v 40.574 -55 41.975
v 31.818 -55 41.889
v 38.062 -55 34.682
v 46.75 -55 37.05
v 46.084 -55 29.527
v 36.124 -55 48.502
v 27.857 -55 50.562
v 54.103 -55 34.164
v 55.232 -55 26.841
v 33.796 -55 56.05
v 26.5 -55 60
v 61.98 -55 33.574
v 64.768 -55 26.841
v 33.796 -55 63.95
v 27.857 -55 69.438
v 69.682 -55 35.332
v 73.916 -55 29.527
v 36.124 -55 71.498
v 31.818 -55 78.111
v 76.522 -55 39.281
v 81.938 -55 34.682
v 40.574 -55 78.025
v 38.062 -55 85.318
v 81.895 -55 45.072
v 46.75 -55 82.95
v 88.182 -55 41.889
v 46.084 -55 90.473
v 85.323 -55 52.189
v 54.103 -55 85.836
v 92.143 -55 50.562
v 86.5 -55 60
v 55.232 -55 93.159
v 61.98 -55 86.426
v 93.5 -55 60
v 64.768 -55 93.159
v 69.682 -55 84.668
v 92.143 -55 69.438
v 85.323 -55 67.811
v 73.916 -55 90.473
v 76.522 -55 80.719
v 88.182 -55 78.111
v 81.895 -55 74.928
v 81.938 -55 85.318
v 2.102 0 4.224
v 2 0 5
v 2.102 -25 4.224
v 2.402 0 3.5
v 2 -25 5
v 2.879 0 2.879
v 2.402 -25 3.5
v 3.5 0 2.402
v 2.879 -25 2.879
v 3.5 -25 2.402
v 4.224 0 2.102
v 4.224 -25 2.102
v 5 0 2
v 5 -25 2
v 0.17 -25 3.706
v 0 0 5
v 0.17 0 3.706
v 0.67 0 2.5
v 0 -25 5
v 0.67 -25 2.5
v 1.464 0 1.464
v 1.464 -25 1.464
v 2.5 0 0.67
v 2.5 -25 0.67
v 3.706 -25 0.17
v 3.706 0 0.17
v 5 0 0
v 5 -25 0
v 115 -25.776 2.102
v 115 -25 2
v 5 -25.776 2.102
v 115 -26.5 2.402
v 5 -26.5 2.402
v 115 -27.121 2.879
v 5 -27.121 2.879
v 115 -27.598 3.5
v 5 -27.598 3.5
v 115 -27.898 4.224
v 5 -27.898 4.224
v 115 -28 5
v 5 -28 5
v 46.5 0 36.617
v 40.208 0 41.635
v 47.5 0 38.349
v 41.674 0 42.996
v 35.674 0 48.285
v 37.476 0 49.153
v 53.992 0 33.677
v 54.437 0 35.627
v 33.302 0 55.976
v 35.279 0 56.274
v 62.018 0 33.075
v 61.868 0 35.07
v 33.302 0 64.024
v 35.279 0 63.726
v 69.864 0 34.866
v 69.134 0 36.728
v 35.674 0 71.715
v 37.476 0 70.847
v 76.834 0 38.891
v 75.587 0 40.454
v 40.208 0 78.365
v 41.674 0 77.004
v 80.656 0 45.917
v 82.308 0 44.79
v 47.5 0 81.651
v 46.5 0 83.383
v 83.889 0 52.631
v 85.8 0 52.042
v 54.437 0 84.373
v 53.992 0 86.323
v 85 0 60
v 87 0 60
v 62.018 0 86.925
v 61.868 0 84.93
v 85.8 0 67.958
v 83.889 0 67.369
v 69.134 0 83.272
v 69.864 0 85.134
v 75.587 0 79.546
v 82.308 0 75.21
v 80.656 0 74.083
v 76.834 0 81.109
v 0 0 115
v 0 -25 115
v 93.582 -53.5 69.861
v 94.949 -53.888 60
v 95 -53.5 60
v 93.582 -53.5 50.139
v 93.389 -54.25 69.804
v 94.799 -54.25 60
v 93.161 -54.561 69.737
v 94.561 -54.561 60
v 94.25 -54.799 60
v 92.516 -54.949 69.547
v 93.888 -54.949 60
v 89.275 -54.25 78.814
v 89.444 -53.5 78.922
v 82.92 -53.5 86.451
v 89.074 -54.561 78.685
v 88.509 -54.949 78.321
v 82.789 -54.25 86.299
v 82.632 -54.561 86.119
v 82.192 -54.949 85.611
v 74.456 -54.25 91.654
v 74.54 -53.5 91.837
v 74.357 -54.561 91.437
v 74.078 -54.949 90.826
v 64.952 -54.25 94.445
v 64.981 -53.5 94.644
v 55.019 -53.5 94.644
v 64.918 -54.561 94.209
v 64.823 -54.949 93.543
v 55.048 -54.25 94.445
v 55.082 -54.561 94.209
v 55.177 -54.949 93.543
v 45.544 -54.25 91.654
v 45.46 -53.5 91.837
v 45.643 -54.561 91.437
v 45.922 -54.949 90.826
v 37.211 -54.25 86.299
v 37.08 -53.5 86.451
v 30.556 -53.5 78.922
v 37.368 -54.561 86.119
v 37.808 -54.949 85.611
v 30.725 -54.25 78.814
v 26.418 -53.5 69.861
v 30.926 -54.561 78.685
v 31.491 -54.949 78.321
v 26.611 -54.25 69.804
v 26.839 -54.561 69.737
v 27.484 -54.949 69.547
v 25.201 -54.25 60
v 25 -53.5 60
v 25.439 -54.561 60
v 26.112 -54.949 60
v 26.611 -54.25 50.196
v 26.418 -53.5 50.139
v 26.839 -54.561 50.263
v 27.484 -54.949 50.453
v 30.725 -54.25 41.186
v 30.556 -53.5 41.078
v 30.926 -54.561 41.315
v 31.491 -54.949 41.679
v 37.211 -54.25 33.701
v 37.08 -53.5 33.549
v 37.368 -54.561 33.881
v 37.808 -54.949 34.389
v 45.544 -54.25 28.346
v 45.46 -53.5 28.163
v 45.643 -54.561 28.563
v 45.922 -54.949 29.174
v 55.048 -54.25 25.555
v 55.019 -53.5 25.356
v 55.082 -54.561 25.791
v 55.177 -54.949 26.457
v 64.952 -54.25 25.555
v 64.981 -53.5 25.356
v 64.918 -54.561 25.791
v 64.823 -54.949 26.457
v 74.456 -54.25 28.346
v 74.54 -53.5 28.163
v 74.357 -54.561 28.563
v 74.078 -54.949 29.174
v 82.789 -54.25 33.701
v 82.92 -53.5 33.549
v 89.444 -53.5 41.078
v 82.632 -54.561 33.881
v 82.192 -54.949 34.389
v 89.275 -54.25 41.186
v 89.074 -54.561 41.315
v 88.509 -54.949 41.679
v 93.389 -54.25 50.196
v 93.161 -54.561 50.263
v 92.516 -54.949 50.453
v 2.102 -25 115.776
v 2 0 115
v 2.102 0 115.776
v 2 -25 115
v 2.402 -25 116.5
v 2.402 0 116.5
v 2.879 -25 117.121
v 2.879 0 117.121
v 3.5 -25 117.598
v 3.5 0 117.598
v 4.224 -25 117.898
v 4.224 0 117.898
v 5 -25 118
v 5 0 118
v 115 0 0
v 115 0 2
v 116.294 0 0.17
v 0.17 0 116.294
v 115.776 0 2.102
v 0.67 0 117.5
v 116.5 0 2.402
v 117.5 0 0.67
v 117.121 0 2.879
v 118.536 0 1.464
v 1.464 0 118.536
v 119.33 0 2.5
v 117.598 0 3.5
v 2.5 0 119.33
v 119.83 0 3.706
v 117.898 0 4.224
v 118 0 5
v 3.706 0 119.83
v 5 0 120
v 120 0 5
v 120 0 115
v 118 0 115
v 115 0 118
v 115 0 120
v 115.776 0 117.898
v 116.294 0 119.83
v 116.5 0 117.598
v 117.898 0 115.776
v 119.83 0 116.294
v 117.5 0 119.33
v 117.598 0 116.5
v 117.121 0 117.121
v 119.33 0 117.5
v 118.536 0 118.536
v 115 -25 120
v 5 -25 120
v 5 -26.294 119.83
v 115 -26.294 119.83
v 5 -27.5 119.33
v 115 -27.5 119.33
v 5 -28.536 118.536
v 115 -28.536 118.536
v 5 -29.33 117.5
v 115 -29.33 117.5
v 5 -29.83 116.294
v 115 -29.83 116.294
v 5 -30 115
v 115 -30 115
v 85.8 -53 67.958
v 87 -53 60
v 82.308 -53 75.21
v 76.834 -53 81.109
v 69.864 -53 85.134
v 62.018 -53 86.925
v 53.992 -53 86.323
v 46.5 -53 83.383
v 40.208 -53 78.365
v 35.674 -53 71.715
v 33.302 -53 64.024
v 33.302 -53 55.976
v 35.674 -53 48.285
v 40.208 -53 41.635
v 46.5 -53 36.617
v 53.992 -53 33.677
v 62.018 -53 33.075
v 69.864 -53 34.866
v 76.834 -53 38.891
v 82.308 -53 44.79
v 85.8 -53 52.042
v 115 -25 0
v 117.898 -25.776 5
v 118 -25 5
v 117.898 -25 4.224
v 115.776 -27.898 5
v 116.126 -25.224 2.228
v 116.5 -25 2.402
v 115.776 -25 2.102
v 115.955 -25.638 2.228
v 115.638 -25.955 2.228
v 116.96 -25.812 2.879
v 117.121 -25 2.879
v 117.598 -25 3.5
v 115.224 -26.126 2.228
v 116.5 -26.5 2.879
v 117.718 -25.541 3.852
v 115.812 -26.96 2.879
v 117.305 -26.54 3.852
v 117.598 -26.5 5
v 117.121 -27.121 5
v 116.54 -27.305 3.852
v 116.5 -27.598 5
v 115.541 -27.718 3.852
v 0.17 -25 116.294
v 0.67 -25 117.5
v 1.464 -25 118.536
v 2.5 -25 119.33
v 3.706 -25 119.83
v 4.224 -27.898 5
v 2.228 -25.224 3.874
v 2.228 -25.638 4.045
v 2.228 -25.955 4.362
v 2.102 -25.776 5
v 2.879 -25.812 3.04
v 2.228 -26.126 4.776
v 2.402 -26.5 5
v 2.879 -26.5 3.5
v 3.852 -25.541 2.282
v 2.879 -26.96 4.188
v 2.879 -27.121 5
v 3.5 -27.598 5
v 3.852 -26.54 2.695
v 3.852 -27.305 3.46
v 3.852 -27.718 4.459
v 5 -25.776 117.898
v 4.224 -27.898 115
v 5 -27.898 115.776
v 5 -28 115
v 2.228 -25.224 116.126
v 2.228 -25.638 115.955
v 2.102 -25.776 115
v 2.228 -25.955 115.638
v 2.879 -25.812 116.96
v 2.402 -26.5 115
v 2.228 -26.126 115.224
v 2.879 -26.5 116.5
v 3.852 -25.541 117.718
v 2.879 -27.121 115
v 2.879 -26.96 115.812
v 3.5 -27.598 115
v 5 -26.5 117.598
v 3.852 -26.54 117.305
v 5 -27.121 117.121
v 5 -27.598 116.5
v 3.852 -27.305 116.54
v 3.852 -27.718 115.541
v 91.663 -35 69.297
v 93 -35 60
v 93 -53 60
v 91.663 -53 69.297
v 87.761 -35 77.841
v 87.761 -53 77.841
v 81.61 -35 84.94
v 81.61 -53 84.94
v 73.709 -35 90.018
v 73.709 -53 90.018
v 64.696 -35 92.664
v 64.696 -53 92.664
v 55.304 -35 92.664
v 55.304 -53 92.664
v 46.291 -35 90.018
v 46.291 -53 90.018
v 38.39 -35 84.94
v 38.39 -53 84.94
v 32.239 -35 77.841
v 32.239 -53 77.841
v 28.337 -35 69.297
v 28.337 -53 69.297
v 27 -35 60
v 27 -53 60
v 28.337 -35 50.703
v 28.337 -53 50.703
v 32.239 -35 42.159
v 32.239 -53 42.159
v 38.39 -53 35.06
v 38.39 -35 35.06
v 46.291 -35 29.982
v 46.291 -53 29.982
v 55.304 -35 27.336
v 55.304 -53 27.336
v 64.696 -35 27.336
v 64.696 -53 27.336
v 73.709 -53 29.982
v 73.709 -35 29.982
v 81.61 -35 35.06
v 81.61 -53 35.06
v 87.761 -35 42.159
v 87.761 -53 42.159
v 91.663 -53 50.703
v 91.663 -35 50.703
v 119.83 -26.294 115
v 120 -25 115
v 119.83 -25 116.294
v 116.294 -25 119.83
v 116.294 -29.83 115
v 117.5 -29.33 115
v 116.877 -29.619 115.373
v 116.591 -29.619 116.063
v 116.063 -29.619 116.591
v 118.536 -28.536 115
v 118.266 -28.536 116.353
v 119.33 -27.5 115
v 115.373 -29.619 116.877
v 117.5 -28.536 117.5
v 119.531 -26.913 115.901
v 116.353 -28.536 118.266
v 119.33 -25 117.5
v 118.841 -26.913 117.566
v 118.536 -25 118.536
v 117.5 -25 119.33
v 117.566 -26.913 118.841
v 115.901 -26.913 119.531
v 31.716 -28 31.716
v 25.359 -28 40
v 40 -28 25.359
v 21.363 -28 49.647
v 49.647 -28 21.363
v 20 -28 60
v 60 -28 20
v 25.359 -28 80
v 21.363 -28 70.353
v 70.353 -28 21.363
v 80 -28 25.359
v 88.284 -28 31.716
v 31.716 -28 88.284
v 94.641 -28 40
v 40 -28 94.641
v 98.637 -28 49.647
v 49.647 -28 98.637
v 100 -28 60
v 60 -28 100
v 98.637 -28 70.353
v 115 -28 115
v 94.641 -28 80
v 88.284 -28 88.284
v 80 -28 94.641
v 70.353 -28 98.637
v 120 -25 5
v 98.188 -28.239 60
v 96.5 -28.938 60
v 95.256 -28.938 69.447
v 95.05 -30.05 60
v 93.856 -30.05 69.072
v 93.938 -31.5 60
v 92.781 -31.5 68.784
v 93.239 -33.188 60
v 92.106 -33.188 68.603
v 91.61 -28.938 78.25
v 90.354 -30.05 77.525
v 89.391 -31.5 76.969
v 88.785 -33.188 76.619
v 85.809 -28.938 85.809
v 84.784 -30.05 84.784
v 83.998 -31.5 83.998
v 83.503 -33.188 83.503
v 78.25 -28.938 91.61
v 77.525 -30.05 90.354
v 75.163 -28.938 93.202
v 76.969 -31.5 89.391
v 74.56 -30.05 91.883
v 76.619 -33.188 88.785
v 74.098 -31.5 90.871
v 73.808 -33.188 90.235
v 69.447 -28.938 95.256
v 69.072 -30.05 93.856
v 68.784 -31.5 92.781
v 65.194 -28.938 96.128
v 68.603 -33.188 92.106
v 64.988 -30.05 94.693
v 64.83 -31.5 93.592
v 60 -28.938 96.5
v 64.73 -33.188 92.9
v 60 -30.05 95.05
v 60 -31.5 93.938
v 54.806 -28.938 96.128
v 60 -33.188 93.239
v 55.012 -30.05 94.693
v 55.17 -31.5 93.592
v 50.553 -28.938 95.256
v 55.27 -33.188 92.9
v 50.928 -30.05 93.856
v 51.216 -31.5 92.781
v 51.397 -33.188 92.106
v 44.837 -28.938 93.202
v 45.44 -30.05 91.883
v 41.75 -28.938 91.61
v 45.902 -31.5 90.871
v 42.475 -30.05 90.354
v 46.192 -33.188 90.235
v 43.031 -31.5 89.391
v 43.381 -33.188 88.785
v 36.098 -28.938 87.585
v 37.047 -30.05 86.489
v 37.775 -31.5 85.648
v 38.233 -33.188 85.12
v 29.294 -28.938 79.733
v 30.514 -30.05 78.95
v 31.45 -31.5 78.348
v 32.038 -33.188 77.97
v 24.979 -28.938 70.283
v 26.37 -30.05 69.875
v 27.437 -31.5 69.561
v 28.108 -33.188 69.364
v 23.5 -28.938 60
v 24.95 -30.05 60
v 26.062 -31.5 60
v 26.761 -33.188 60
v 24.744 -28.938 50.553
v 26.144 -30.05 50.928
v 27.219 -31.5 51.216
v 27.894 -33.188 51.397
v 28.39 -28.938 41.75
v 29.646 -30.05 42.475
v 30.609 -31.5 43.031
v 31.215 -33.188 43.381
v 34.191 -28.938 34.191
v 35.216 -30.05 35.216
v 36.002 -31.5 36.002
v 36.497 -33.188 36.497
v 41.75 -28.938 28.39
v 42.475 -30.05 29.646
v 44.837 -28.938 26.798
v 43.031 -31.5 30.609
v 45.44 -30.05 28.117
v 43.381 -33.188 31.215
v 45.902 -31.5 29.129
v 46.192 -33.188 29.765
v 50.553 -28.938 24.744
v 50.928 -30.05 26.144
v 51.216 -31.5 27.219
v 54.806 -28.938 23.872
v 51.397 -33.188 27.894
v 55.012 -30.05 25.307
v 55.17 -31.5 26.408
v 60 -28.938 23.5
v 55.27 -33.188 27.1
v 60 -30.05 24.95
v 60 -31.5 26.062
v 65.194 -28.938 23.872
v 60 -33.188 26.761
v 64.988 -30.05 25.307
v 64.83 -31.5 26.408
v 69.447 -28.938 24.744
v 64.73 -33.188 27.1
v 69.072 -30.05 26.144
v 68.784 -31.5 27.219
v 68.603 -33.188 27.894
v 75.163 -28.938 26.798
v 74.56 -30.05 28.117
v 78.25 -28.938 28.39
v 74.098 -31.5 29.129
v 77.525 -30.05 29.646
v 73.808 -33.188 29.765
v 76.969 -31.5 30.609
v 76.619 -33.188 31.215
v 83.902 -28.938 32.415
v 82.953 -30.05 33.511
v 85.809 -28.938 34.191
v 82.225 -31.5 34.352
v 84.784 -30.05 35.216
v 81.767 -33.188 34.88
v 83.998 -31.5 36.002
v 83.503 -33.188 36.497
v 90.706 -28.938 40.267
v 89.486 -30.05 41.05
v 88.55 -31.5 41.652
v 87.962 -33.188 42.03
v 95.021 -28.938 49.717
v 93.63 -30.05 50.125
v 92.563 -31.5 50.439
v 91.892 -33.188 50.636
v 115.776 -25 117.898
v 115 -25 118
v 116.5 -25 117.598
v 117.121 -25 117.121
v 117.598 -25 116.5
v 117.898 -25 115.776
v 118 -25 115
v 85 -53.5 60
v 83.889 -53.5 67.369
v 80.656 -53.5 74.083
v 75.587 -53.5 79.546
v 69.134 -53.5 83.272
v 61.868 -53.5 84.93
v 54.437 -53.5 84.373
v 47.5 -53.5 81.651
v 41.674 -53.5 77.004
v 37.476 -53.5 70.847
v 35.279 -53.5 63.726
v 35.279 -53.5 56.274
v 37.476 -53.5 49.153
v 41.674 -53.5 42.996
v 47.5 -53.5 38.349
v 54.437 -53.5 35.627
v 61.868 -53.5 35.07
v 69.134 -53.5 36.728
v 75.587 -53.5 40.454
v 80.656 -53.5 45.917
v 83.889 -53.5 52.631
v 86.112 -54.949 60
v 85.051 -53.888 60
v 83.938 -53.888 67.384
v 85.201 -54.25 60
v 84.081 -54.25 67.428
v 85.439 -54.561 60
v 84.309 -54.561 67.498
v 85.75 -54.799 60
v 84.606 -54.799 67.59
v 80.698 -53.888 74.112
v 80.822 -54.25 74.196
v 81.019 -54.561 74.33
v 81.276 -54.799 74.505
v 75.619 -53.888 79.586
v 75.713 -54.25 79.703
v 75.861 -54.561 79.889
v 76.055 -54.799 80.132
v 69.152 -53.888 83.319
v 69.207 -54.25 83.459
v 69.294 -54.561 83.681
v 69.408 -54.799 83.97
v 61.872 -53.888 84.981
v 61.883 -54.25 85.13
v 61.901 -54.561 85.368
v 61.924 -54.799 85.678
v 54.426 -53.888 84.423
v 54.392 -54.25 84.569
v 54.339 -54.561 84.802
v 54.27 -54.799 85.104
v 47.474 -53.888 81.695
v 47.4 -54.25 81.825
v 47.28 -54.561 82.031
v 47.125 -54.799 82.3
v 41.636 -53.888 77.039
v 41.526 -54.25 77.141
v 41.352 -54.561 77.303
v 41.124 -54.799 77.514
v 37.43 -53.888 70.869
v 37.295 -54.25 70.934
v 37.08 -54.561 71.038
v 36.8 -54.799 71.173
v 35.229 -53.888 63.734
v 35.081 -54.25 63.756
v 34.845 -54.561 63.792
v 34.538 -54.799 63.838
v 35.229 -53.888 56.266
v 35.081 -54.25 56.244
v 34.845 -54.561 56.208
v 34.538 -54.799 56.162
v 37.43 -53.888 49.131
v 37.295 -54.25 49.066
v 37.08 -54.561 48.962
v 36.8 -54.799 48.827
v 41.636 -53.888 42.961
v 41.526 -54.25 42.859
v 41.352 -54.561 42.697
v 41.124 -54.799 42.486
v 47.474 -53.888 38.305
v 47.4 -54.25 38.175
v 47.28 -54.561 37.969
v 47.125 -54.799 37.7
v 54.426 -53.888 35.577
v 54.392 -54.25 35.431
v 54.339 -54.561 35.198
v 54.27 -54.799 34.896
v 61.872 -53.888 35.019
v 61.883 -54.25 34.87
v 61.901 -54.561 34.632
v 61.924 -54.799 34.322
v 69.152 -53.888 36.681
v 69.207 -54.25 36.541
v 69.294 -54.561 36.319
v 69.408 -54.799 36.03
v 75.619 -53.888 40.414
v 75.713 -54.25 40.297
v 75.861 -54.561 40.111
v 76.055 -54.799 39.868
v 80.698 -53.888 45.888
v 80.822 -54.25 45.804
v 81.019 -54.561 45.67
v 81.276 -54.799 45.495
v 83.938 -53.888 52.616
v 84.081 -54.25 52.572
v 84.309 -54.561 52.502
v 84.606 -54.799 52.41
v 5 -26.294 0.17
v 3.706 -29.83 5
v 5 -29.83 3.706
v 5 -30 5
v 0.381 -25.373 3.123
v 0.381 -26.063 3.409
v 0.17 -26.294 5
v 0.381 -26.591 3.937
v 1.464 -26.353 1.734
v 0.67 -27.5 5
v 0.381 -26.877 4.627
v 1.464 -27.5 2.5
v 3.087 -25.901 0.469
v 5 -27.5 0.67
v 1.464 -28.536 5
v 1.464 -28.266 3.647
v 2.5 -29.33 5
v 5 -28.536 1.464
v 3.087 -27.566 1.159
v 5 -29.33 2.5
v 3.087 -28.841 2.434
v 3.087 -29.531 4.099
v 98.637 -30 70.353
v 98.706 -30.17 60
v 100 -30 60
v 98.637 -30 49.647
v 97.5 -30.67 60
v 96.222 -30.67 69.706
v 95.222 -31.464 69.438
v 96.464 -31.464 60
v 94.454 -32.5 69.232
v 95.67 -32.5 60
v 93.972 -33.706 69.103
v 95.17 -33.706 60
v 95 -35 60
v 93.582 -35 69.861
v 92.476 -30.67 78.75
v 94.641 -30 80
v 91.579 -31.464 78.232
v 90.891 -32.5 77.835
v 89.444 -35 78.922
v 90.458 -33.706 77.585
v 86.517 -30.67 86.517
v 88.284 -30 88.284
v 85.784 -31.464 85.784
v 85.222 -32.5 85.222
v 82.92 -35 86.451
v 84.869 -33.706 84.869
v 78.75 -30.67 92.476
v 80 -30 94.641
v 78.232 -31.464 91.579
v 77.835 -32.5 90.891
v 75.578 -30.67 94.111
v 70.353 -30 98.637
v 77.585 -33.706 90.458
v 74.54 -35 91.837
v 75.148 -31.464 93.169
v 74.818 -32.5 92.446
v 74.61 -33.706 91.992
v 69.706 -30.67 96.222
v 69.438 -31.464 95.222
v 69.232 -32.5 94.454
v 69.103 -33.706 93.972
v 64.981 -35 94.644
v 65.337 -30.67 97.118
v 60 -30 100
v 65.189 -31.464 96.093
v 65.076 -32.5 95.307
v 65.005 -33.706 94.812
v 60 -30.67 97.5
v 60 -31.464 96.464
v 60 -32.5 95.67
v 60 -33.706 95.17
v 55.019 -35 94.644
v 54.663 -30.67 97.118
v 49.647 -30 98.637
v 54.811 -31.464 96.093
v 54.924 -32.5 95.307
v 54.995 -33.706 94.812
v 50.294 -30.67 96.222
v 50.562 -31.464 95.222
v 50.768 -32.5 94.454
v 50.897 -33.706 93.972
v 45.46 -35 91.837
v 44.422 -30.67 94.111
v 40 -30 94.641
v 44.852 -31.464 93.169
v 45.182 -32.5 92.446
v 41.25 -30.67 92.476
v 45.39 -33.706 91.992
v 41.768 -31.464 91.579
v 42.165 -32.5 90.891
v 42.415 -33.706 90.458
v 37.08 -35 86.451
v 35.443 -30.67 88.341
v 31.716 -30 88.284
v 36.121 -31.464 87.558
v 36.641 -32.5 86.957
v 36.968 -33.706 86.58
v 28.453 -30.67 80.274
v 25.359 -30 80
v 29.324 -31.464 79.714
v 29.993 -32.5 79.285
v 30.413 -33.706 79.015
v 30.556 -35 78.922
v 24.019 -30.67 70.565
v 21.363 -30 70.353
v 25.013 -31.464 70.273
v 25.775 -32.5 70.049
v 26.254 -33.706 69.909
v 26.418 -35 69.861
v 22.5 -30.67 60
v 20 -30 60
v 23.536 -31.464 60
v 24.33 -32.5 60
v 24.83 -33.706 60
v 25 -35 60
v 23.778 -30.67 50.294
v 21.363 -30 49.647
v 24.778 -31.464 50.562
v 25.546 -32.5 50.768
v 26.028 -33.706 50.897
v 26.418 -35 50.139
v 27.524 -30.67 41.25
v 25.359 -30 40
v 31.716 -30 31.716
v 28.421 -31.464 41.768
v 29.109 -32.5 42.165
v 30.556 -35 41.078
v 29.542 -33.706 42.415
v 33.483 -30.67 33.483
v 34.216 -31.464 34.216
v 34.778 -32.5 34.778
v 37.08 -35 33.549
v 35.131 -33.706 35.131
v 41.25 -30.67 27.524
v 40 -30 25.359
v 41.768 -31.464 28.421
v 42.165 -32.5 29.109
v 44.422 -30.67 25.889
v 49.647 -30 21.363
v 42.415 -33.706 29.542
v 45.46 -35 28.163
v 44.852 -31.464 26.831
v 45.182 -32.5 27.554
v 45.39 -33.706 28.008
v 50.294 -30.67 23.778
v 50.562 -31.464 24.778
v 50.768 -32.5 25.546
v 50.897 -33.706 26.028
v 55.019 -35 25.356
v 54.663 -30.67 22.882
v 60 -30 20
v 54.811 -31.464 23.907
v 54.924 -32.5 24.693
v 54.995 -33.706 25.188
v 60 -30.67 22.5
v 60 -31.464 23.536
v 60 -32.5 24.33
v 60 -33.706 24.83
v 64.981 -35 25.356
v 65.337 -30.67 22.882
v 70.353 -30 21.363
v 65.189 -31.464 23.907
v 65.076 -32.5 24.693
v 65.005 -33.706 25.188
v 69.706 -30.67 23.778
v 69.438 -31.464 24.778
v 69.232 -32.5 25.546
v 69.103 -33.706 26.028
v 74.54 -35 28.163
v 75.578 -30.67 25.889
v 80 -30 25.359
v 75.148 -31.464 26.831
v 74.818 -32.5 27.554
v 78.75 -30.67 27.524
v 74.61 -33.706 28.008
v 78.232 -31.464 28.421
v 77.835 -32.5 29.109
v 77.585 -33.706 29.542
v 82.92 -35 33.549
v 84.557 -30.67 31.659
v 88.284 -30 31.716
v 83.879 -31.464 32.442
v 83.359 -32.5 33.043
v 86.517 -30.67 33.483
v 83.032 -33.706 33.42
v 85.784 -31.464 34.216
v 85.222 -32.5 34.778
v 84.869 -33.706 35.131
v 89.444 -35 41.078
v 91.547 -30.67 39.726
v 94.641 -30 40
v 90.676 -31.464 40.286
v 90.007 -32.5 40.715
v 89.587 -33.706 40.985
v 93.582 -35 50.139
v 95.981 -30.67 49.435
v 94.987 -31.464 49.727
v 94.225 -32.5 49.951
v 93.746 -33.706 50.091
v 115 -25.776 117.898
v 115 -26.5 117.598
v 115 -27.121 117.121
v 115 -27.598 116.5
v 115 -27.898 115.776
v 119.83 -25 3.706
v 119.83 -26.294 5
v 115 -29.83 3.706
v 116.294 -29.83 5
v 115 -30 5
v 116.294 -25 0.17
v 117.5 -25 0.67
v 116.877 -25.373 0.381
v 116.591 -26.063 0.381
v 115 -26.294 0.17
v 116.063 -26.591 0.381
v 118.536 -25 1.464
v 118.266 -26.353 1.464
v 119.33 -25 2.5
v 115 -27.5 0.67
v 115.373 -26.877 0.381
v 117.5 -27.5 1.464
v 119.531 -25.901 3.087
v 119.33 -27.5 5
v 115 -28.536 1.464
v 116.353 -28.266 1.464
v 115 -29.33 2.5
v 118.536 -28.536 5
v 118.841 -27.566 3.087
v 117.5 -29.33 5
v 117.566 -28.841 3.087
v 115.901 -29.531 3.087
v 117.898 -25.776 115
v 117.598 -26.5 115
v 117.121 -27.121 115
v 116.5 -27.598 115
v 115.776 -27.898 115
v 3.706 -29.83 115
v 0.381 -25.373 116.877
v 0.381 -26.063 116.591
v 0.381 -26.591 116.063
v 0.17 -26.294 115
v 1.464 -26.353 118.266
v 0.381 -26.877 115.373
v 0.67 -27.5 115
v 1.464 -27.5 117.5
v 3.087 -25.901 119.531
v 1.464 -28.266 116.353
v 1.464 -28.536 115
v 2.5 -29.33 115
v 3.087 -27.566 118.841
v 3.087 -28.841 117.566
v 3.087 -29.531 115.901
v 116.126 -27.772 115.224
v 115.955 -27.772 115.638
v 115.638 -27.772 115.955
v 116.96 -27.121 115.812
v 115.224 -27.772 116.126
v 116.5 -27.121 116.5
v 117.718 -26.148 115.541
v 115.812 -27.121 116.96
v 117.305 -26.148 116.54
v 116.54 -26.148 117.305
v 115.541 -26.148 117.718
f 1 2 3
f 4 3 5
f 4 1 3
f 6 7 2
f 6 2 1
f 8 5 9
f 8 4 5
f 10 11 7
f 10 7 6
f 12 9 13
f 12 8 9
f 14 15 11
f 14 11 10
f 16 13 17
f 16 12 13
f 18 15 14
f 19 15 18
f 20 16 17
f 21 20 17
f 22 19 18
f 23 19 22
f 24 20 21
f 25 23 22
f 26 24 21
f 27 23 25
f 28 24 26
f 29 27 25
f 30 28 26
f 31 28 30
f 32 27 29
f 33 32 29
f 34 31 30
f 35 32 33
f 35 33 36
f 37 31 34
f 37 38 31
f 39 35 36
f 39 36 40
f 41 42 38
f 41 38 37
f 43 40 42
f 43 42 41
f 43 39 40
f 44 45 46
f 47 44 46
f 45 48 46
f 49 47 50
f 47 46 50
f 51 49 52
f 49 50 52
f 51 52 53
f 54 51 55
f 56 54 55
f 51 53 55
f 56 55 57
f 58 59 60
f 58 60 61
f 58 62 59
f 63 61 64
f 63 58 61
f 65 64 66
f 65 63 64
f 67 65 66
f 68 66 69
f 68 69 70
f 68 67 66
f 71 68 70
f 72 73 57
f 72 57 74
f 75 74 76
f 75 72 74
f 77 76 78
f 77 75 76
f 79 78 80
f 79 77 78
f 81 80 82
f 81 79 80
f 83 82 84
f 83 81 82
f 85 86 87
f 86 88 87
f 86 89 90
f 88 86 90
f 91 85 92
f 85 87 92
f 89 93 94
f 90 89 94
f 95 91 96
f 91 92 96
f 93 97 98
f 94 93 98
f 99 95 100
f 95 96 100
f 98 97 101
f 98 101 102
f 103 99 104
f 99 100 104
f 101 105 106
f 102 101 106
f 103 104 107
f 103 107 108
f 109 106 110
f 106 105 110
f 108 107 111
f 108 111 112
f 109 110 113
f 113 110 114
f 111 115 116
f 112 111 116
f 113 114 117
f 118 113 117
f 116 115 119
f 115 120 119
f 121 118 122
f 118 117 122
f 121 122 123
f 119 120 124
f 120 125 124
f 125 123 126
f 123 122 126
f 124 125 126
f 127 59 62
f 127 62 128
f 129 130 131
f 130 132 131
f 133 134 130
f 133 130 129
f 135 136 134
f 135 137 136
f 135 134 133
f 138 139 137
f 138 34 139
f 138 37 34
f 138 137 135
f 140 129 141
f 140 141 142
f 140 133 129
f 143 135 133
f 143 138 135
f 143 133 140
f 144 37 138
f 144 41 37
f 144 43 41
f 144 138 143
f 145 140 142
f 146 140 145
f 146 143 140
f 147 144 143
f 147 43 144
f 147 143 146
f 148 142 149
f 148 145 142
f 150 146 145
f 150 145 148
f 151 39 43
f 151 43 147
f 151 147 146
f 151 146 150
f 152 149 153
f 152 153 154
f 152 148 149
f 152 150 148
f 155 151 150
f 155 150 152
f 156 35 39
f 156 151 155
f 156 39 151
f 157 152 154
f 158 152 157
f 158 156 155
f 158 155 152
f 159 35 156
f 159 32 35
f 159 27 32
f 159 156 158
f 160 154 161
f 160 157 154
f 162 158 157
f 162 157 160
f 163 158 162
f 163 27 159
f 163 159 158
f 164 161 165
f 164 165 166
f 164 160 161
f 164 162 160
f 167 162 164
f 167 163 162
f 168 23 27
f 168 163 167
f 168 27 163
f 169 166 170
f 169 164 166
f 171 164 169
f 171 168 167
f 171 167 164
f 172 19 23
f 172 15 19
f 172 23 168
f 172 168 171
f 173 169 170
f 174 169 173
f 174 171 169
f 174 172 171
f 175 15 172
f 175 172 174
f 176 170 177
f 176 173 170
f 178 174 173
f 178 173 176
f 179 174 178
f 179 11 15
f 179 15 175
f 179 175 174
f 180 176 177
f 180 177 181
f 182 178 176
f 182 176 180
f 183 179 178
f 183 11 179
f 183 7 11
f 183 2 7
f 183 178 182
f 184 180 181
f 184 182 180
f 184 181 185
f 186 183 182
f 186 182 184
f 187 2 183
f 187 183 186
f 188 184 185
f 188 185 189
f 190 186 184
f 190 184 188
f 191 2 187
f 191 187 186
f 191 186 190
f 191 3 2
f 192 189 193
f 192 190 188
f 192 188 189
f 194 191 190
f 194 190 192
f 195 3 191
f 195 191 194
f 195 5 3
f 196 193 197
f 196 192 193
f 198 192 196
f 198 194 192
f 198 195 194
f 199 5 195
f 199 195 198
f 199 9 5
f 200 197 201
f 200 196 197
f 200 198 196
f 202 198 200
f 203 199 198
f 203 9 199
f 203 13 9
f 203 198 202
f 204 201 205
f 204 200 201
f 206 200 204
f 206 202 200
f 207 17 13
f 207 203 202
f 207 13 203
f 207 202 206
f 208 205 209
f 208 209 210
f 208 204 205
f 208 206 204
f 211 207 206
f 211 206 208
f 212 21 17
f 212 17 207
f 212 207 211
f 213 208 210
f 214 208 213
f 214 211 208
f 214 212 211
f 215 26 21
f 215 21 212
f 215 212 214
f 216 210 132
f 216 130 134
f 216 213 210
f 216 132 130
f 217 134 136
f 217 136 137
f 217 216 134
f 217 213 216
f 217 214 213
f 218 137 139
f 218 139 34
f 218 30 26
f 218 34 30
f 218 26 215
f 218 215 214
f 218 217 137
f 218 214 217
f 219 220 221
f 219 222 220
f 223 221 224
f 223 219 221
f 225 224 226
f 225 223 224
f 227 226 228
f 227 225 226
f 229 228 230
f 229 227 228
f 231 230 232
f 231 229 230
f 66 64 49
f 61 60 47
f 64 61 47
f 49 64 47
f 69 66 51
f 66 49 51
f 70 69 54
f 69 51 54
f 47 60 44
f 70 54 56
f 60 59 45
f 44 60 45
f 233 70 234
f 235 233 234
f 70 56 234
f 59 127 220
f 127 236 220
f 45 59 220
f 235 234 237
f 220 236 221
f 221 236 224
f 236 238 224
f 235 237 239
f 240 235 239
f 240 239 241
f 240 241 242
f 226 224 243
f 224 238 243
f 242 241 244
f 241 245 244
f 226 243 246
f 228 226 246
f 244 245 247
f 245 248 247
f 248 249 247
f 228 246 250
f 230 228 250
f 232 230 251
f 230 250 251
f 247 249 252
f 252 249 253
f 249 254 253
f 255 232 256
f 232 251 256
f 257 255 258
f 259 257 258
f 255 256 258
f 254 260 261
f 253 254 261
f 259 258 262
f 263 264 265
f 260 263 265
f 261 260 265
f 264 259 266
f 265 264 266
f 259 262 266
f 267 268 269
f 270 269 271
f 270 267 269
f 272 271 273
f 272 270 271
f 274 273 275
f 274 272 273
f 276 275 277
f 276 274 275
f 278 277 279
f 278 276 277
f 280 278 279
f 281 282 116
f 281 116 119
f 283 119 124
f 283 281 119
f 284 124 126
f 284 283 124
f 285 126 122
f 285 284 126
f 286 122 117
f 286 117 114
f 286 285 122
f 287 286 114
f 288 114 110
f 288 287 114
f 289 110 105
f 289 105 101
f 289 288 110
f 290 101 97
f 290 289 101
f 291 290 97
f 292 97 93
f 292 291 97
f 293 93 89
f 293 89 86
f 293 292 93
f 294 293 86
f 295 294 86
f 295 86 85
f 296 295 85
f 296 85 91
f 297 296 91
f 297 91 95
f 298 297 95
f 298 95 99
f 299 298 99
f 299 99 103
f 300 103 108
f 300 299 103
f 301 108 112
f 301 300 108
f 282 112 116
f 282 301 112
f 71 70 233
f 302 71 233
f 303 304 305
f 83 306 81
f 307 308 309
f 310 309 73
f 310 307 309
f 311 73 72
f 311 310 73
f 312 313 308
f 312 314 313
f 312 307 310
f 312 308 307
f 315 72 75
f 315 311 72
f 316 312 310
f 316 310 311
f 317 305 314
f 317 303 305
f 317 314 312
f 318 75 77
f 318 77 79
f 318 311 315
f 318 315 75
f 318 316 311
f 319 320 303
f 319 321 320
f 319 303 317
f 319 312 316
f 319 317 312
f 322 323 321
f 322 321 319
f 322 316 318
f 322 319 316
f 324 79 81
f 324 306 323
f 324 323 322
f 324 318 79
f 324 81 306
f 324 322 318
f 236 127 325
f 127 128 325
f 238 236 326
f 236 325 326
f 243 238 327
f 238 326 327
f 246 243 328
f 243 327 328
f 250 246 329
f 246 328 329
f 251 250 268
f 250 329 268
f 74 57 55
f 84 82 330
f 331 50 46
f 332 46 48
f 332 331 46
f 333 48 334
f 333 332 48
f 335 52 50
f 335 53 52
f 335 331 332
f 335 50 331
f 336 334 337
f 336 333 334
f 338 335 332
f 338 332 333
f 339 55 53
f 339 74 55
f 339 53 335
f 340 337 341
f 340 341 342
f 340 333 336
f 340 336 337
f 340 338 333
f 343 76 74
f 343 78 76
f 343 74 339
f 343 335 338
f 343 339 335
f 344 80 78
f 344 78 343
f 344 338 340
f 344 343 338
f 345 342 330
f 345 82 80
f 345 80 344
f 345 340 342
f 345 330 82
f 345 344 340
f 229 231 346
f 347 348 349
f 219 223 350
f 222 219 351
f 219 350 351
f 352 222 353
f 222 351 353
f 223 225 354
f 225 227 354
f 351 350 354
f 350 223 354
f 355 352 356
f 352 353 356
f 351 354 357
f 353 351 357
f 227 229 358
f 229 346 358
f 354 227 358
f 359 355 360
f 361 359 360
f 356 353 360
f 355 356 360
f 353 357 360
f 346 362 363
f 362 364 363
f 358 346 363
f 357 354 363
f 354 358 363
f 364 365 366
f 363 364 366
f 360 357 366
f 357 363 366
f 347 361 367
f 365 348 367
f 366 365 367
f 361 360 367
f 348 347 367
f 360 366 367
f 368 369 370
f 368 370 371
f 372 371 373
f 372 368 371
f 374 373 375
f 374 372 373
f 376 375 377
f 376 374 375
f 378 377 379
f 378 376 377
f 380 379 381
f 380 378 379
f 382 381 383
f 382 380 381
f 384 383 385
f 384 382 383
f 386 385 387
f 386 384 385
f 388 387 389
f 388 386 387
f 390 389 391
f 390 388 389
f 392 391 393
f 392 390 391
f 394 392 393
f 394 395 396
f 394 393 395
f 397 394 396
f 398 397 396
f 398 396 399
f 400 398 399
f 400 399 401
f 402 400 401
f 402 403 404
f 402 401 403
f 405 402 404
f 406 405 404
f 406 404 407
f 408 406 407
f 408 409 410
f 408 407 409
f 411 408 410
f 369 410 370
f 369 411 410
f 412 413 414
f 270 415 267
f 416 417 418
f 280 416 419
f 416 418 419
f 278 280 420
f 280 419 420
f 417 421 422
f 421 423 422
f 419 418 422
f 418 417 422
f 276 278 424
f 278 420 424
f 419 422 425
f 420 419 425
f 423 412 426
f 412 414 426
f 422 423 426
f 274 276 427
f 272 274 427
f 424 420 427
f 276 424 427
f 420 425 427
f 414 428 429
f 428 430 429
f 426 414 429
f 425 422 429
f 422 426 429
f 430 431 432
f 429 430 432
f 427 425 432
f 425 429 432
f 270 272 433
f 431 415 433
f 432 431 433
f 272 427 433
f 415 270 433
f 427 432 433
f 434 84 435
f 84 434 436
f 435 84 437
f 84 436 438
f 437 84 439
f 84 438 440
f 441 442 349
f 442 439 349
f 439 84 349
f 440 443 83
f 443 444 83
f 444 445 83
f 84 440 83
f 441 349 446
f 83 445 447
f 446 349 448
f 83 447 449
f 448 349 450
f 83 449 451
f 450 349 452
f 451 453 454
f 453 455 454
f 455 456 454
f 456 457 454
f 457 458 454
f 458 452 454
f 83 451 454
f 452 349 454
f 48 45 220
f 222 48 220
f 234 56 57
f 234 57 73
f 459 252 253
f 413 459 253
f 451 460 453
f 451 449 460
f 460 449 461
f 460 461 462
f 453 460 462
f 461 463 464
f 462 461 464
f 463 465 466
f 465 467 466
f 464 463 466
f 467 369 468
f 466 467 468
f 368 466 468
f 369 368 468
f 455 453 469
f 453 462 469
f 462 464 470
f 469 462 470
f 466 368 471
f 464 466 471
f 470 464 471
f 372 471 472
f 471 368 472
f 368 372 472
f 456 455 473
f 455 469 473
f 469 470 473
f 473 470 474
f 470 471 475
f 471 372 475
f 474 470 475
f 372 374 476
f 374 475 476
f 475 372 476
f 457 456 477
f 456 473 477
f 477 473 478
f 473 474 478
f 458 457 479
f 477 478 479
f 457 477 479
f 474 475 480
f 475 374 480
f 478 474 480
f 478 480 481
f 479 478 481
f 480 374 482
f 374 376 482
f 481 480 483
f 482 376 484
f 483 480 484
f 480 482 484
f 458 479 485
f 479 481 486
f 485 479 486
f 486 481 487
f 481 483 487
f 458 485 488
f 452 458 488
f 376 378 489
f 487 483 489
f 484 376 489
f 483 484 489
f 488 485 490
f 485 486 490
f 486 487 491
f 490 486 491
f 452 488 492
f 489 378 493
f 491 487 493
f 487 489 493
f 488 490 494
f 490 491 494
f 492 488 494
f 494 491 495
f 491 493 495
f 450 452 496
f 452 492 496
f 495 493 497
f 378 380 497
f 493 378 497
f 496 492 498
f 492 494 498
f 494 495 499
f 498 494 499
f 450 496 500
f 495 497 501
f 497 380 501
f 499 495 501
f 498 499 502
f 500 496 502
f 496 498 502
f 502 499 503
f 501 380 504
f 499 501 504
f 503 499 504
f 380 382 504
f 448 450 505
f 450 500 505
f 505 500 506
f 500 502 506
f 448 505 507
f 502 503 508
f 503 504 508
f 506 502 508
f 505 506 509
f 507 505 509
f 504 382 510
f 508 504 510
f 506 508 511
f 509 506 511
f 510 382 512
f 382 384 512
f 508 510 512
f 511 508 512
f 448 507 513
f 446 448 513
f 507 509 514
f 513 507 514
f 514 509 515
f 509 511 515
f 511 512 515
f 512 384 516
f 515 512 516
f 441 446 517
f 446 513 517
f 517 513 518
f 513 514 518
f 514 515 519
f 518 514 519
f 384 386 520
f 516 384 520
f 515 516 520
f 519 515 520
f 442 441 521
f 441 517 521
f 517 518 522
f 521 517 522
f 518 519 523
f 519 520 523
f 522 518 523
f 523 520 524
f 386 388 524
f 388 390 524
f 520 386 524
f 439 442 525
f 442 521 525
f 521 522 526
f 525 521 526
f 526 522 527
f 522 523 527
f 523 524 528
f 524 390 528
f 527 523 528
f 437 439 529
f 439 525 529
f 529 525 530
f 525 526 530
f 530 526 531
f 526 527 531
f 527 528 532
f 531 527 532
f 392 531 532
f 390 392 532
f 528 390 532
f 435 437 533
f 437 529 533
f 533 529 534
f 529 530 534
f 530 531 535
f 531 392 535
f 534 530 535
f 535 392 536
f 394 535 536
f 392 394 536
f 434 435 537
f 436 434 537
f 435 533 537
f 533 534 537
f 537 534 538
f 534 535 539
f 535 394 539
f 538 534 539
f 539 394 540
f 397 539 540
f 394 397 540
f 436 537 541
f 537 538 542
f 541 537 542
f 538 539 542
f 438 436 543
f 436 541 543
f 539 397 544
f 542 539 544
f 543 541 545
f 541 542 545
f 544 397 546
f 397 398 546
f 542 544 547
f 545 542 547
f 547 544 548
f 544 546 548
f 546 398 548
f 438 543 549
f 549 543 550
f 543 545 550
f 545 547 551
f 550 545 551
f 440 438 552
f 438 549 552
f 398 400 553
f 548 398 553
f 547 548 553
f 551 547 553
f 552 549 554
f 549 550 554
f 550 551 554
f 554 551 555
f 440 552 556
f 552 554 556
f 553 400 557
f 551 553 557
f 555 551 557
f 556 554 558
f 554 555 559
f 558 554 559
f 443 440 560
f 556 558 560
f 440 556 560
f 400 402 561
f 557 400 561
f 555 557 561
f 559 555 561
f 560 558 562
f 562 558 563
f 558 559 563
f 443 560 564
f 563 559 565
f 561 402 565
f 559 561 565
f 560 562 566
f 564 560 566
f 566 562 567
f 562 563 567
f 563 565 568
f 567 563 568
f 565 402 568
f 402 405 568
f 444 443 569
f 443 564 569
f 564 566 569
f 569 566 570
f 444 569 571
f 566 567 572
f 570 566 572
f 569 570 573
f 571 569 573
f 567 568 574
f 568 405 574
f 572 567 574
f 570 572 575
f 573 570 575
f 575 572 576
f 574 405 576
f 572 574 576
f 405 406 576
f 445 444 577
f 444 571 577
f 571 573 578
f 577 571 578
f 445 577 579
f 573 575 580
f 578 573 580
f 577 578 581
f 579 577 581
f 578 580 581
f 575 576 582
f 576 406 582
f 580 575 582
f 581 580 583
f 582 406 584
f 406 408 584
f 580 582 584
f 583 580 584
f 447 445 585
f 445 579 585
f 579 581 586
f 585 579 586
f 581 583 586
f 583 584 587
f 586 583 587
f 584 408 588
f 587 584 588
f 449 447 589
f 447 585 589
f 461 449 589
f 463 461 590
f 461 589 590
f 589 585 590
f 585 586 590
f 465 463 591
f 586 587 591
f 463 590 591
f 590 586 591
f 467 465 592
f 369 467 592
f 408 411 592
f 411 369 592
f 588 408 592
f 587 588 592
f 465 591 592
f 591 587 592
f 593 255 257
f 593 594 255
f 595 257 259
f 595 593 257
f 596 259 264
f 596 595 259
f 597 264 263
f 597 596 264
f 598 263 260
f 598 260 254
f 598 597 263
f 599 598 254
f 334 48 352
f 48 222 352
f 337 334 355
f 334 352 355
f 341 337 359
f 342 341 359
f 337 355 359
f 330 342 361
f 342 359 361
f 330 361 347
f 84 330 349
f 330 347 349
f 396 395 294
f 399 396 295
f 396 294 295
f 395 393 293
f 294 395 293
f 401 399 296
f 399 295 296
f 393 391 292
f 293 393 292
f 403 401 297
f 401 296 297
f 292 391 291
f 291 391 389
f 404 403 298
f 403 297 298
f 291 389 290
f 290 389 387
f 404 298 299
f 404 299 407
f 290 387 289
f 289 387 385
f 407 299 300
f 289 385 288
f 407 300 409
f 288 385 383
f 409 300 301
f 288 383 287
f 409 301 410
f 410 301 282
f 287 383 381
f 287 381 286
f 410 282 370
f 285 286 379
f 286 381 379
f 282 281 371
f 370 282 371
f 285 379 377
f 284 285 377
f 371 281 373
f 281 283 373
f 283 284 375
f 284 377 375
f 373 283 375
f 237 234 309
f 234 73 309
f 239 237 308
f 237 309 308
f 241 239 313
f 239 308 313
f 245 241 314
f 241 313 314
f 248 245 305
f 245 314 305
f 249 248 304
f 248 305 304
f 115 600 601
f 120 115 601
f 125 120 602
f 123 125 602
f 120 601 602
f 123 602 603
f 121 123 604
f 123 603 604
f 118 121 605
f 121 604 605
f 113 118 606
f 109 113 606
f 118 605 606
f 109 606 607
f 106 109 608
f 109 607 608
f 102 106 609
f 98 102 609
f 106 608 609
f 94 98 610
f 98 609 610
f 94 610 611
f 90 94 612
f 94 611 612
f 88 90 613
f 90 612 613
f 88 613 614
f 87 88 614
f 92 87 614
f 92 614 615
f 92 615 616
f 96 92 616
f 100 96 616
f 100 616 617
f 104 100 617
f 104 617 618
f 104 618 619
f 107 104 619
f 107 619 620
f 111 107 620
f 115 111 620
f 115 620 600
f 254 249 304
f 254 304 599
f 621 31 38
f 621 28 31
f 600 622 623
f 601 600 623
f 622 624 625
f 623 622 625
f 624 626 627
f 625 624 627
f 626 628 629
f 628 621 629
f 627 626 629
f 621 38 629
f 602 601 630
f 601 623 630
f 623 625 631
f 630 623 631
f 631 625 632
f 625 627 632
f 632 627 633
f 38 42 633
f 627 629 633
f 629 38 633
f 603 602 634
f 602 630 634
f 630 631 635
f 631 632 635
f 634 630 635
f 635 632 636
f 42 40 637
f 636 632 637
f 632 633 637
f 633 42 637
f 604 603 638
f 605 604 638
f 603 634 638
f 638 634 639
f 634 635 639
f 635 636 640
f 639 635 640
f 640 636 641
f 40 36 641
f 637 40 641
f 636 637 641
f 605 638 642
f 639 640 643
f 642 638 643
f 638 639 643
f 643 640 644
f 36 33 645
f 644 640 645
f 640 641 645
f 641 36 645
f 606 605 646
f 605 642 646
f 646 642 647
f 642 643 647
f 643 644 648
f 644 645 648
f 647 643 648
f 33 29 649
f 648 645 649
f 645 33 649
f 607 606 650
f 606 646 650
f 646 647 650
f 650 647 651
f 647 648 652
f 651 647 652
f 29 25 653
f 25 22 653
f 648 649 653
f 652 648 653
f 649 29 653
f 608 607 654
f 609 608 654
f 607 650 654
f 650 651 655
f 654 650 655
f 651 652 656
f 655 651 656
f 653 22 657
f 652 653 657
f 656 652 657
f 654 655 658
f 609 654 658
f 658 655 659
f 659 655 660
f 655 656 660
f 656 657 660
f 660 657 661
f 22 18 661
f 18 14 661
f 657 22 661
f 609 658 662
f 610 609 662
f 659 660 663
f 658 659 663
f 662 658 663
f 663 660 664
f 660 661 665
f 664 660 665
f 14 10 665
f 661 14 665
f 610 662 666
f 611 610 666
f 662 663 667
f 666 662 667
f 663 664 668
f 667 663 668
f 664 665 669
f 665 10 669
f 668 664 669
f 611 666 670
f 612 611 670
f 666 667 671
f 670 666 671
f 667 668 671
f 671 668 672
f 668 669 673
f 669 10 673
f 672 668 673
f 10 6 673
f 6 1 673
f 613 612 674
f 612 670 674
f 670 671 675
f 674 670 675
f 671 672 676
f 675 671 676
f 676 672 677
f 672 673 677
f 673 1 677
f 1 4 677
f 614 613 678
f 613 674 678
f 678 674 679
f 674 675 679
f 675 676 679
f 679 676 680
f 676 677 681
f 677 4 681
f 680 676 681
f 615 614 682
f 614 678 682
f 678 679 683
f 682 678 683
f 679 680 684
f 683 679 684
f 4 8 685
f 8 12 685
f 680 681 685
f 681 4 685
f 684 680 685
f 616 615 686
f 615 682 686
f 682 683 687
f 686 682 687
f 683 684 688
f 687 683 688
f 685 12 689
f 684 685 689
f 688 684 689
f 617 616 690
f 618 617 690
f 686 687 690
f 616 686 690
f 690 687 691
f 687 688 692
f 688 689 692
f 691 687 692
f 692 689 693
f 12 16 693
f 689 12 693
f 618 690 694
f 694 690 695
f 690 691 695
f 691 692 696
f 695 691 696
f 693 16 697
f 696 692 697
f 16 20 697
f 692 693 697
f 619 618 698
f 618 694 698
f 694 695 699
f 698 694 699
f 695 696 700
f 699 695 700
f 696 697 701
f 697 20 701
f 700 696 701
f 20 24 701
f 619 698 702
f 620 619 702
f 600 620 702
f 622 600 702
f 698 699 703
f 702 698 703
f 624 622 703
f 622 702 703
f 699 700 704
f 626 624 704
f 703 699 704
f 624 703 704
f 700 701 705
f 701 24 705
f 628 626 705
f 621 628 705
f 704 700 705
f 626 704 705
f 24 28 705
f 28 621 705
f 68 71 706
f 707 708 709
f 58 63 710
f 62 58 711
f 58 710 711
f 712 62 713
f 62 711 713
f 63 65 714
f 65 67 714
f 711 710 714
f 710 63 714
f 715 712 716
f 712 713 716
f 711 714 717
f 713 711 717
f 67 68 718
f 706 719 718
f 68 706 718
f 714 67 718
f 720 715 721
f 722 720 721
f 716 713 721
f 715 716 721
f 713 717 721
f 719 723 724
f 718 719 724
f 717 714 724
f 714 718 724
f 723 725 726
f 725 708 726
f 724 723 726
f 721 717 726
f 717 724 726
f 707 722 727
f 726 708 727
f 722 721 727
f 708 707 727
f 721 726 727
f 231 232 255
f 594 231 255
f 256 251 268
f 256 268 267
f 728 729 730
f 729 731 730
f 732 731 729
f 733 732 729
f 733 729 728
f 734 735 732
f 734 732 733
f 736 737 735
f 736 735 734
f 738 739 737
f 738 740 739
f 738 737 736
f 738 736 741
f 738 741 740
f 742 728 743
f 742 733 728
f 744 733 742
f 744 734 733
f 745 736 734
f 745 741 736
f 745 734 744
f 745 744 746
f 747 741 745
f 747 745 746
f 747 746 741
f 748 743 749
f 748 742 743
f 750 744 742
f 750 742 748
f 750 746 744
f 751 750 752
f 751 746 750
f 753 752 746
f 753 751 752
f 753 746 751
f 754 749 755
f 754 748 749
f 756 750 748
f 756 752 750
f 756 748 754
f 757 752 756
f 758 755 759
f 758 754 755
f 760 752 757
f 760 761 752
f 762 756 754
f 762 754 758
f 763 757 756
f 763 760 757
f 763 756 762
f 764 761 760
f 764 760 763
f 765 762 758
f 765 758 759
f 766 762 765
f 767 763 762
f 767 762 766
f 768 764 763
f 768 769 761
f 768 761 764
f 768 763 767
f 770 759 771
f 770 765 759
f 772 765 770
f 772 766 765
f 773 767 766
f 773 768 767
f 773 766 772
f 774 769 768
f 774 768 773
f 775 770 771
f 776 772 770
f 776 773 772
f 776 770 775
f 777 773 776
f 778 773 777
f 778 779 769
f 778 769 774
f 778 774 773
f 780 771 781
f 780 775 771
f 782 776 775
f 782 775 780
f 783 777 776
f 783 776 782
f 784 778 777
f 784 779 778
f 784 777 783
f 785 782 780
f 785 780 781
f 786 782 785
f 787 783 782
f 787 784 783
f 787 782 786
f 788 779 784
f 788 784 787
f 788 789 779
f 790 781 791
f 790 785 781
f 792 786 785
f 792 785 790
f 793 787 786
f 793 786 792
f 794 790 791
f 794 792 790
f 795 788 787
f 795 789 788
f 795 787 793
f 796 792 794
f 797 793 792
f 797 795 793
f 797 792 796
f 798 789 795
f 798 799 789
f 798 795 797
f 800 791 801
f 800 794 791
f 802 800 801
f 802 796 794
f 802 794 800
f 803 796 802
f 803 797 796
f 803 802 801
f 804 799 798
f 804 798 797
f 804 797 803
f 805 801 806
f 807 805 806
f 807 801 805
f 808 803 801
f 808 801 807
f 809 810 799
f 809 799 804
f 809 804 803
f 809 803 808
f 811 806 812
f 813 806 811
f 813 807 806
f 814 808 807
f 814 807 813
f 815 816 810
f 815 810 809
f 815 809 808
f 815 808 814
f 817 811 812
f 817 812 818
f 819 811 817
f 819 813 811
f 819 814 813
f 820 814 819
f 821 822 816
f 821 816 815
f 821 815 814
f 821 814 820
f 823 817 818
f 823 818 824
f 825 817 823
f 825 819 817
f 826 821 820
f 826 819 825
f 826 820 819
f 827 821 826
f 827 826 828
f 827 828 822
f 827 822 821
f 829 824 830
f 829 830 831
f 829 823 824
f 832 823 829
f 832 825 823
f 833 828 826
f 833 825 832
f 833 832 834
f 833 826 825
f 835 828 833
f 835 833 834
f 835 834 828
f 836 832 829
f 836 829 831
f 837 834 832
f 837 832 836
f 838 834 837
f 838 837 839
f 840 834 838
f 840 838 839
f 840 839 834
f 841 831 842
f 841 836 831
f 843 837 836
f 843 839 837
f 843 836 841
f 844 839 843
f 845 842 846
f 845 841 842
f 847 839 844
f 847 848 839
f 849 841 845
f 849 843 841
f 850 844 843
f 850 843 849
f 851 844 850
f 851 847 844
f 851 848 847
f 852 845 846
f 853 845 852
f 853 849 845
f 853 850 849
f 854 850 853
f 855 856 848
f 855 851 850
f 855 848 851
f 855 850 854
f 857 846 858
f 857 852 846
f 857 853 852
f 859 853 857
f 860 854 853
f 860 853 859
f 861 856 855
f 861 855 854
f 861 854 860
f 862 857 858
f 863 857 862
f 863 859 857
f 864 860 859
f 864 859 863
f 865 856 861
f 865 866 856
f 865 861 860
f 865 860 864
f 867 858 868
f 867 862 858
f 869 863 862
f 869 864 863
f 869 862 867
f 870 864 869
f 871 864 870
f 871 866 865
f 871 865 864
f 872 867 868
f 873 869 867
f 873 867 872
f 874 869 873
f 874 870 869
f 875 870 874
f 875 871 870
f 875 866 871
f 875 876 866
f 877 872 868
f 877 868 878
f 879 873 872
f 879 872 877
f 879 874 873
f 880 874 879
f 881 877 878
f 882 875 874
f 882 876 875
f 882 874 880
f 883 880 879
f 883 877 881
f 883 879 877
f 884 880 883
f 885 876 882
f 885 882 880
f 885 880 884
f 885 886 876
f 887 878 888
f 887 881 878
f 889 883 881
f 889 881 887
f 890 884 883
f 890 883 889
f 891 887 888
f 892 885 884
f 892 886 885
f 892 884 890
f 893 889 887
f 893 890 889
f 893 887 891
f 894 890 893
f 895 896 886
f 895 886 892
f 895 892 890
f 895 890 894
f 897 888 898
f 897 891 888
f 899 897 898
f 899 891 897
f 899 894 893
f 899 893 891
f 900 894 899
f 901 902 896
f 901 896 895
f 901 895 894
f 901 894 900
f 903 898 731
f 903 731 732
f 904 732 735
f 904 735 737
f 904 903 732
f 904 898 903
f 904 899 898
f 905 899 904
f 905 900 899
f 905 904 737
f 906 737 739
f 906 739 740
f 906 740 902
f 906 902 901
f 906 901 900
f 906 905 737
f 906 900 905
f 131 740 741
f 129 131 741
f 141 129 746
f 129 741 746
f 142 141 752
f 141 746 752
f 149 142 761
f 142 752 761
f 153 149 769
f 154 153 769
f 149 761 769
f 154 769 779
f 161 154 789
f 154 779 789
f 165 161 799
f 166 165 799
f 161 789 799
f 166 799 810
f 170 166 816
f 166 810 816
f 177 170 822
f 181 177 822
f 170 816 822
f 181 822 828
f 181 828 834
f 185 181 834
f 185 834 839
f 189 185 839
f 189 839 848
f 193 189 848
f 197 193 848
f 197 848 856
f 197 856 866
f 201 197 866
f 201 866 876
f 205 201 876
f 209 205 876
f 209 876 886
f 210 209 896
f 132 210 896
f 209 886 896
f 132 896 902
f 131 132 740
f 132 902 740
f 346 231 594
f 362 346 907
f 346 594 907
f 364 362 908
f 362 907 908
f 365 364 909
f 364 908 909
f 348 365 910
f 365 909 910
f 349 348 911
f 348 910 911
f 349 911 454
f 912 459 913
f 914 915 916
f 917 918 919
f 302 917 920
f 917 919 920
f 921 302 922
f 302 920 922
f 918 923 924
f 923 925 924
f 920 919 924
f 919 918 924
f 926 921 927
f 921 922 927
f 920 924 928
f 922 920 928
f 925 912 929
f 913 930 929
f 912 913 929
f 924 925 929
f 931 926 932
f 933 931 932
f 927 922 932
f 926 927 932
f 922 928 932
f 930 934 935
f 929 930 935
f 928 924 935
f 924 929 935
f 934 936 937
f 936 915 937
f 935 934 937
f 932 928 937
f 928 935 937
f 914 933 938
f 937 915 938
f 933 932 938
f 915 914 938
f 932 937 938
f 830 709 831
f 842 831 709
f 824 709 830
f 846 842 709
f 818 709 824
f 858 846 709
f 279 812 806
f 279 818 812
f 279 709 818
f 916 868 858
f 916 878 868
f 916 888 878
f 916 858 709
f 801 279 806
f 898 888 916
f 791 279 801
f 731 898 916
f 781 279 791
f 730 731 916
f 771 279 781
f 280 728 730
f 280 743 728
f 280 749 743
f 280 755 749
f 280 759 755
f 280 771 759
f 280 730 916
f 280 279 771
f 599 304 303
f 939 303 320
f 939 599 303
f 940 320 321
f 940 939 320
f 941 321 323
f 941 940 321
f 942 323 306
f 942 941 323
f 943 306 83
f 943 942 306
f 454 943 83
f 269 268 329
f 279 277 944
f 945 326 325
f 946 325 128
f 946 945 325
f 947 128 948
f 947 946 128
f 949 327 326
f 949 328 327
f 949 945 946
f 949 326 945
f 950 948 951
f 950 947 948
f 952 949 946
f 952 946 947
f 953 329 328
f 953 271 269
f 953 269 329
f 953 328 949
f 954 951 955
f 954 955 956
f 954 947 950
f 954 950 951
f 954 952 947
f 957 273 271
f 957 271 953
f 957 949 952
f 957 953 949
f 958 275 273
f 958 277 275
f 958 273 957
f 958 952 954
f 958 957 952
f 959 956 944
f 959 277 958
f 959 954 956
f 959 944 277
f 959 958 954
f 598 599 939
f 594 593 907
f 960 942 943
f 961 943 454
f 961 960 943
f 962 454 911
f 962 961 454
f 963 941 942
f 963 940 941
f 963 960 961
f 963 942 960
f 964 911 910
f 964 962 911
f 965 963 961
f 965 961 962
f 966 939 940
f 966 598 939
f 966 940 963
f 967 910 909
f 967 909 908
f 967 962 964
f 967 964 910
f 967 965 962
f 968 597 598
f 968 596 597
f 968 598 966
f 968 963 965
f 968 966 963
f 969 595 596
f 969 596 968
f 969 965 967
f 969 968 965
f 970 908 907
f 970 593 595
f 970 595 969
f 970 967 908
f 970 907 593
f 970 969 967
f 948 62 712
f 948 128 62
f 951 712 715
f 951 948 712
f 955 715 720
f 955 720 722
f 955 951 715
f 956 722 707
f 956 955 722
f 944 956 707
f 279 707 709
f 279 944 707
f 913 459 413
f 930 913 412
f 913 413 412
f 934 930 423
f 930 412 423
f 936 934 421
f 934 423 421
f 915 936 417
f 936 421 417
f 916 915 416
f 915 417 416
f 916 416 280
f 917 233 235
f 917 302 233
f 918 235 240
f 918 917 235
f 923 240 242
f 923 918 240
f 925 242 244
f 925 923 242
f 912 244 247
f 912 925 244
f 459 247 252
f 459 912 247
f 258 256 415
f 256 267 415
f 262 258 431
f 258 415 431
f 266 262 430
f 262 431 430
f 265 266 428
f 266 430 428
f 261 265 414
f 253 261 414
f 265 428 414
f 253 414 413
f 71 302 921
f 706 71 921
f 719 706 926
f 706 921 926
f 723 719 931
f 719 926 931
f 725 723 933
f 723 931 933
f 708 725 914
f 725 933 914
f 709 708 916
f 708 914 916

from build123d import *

# Parameters (mm, degrees)
F0_W     = 120
F0_H     = 120
F1_DEPTH = 30
F2_R     = 35
F3_DEPTH = 25
F4_R     = 25
F5_DEPTH = 55.001
F6_R     = 1.5
F7_R     = 5
F8_T     = -2


with BuildPart() as f1:
    # F0 (on Front) → F1 (new body)
    with BuildSketch(Plane.XZ):
        with Locations((60, 60)):
            Rectangle(F0_W, F0_H)
    extrude(amount=F1_DEPTH)

    # F2 (on face) → F3 (join)
    with BuildSketch(Plane.XZ.offset(30)):
        with Locations((60, 60)):
            Circle(F2_R)
    extrude(amount=F3_DEPTH)

    # F4 (on face) → F5 (cut, through all)
    with BuildSketch(Plane.XZ.offset(55)):
        with Locations((60, 60)):
            Circle(F4_R)
    extrude(amount=-F5_DEPTH, mode=Mode.SUBTRACT)

    # F6
    f6_edges = [f1.edges().sort_by_distance(p)[0] for p in [
        (35, -55, 60),
        (25, -55, 60),
    ]]
    fillet(f6_edges, radius=F6_R)

    # F7
    f7_edges = [f1.edges().sort_by_distance(p)[0] for p in [
        (25, -30, 60),
        (120, -15, 120),
        (120, -30, 60),
        (60, -30, 120),
        (0, -15, 120),
        (120, -15, 0),
        (60, -30, 0),
        (0, -15, 0),
        (0, -30, 60),
    ]]
    fillet(f7_edges, radius=F7_R)

    # F8
    f8_openings = [f1.faces().sort_by_distance(p)[0] for p in [
        (1.697056, 0, 60),
    ]]
    offset(amount=F8_T, openings=f8_openings)


solid = f1.part
